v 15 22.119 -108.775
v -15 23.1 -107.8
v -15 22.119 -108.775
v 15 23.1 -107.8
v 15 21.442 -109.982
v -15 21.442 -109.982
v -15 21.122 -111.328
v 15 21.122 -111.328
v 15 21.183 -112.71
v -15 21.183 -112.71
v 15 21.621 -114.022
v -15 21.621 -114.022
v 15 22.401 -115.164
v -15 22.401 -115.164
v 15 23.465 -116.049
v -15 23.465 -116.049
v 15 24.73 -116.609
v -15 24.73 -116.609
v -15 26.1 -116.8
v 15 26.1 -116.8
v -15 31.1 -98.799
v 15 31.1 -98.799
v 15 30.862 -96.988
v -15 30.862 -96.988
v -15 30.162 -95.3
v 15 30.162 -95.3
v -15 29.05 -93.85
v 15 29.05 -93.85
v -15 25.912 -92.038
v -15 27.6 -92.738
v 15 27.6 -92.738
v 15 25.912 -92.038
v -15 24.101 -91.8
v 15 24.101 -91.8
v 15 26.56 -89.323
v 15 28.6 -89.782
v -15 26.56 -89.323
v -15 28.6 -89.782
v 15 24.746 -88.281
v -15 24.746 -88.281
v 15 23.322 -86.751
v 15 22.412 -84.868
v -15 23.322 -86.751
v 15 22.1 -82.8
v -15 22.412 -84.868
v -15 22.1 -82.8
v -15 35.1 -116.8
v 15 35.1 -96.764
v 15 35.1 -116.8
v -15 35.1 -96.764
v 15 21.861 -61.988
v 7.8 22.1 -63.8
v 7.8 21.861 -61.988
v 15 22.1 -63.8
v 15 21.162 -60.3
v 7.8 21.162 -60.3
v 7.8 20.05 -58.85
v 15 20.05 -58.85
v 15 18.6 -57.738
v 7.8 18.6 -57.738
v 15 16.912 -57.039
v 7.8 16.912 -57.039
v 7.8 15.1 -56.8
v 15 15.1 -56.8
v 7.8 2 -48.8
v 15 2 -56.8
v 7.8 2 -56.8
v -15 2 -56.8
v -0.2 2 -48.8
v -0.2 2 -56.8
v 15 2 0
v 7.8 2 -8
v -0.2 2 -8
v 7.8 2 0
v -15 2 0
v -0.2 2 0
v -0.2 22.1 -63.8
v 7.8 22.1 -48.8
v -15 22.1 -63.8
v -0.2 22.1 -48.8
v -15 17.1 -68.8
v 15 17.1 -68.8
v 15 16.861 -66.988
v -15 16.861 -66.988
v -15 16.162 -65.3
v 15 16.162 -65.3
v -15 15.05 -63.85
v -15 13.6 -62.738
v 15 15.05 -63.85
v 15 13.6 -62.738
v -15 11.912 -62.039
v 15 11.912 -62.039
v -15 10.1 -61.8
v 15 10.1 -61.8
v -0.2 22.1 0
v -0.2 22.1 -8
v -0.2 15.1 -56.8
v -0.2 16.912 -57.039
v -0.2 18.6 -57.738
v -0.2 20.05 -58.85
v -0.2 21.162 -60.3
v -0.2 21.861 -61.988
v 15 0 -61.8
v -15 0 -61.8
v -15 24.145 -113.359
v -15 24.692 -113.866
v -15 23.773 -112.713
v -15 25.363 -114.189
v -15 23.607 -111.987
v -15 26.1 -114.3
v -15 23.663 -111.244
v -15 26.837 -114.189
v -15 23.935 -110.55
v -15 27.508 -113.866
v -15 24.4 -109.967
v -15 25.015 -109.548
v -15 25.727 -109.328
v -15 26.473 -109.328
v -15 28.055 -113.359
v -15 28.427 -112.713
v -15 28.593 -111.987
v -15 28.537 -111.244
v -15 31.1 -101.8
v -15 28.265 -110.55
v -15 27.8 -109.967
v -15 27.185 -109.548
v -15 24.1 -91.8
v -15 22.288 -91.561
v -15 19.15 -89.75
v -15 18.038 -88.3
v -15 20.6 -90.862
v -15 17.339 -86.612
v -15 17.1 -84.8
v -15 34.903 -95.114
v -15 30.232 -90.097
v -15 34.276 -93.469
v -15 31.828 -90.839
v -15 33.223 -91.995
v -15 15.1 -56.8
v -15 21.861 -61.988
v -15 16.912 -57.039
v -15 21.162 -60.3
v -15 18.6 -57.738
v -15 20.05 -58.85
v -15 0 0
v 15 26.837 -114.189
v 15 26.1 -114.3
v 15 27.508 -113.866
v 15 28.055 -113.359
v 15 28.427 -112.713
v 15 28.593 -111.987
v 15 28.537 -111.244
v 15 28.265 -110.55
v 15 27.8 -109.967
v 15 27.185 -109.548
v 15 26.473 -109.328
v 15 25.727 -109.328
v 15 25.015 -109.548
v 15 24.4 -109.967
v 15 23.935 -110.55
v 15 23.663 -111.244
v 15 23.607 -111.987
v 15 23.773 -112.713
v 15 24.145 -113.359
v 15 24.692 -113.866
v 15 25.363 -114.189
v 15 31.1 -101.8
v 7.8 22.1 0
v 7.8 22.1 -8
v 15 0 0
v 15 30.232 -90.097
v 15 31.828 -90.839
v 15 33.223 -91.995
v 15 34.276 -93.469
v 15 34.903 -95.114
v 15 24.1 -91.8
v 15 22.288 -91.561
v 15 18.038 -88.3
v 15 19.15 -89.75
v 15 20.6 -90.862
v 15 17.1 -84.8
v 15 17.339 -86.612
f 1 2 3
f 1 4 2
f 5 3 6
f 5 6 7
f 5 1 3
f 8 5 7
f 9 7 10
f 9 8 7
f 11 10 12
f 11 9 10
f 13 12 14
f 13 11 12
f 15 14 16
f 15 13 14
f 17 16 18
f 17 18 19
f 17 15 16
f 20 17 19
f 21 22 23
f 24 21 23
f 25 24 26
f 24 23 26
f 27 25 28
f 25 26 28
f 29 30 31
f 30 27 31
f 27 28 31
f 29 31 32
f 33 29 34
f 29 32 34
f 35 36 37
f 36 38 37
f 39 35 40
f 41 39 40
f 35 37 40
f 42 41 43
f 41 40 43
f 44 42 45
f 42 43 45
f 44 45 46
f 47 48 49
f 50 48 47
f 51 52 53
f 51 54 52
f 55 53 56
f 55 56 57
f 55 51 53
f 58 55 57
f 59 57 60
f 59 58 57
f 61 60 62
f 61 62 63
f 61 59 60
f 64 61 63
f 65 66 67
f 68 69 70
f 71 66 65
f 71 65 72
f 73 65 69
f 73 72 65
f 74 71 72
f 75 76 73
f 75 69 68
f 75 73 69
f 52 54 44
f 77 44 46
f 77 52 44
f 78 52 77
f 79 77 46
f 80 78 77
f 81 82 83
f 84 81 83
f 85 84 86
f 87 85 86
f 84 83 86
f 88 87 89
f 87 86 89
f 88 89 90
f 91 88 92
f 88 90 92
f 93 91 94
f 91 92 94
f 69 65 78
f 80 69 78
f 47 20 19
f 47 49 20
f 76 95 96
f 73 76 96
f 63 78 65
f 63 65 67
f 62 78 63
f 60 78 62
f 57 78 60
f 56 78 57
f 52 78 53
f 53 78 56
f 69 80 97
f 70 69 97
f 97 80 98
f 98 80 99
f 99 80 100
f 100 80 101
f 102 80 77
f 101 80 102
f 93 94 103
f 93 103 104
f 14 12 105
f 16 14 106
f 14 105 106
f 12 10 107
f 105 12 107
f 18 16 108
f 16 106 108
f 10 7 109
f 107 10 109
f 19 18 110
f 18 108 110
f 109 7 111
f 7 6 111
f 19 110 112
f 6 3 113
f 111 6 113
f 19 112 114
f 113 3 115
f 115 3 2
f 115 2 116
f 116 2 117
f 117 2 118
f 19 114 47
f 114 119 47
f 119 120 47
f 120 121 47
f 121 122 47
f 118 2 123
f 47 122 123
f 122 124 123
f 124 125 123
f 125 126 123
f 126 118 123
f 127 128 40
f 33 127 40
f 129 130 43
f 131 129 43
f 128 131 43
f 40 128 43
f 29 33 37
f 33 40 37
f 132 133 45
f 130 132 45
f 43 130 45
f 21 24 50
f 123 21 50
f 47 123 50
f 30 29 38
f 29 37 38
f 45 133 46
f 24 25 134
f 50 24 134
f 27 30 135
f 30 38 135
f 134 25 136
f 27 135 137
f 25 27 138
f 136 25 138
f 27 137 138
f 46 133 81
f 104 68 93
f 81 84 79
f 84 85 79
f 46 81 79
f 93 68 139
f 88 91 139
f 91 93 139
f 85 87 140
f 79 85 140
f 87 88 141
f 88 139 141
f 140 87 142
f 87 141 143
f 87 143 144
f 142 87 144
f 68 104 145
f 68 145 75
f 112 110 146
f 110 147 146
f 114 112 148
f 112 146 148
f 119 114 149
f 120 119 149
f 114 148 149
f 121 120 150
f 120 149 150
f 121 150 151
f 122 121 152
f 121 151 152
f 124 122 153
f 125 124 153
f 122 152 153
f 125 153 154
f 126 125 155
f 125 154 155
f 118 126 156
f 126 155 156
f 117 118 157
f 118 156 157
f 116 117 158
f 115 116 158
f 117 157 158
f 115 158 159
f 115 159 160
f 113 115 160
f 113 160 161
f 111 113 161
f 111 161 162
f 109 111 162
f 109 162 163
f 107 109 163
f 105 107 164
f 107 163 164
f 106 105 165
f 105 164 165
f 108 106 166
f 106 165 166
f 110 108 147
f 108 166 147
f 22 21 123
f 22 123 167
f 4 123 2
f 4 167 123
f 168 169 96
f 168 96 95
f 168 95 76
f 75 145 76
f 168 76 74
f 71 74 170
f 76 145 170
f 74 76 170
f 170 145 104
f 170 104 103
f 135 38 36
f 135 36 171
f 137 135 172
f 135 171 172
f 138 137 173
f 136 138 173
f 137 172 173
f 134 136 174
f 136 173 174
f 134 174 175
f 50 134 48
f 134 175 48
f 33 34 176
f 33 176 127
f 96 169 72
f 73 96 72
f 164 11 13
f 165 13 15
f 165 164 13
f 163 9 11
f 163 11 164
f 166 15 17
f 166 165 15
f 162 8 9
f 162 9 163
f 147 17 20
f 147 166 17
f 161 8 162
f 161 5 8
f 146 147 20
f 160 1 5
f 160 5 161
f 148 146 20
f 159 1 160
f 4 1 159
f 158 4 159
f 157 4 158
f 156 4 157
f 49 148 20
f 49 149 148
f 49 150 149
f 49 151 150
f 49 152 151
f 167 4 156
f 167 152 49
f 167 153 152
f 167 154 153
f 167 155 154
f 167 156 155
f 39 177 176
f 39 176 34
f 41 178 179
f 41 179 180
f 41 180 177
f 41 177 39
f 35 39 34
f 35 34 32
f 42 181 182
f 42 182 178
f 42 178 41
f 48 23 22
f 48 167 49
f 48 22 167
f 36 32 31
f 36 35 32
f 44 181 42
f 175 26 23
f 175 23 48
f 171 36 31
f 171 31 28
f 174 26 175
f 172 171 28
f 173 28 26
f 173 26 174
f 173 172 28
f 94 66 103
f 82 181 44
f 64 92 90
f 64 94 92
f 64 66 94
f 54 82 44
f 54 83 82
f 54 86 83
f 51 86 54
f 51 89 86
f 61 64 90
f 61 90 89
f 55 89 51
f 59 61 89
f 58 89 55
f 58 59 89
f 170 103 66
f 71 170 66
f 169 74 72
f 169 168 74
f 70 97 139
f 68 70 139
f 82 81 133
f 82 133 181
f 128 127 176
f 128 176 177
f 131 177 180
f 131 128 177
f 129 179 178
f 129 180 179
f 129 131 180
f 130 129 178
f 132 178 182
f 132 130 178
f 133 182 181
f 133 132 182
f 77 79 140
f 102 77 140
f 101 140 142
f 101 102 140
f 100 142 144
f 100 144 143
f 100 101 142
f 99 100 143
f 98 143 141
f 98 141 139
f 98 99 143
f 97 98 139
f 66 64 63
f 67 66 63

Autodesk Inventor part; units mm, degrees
ref_plane "YZ Plane" through (0, 0, 0) normal (1, 0, 0) x (0, 1, 0)
ref_plane "XZ Plane" through (0, 0, 0) normal (0, 1, 0) x (-1, 0, 0)
sketch "スケッチ1" plane through (0, 0, 0) normal (0, 1, 0) x (-1, 0, 0)
  line L0 (15, 0) -> (-15, 0)
  line L1 (-15, 0) -> (-15, -56.8)
  line L2 (-15, -56.8) -> (15, -56.8)
  line L3 (15, -56.8) -> (15, 0)
  point P0 (0, 0)
  point P1 (0, 0)
  dimension "d0" = 30
  dimension "d9" = 56.8
extrude "押し出し1" add sketch "スケッチ1" along normal blind 2
ref_plane "作業平面1" through (7.8, 0, 0) normal (1, 0, 0) x (0, 0, -1)
sketch "スケッチ2" plane through (7.8, 0, 0) normal (1, 0, 0) x (0, 0, -1)
  line L0 (0, 2) -> (56.8, 2)
  line L1 (56.8, 2) -> (56.8, 22.1)
  line L2 (56.8, 22.1) -> (0, 22.1)
  line L3 (0, 22.1) -> (0, 2)
  line L4 (8, 2) -> (48.8, 2)
  line L5 (48.8, 2) -> (48.8, 22.1)
  line L6 (48.8, 22.1) -> (8, 22.1)
  line L7 (8, 22.1) -> (8, 2)
  line L8 (0, 2) -> (56.8, 2) projected
  line L9 (0, 0) -> (0, 2) projected
  point P0 (28.4, 22.1)
  dimension "d4" = 56.8
  dimension "d5" = 40.8
  dimension "d6" = 20.1
extrude "押し出し2" add sketch "スケッチ2" against normal blind 8 contours L3 L2 L7 L0 | L5 L2 L1 L0
sketch "スケッチ3" plane through (15, 0, -56.8) normal (0, 0, -1) x (-1, 0, 0)
  line L0 (30, 0) -> (0, 0) projected
  line L1 (0, 0) -> (30, 0)
  line L2 (30, 0) -> (30, 22.1)
  line L3 (30, 22.1) -> (0, 22.1)
  line L4 (0, 22.1) -> (0, 0)
  line L5 (7.2, 22.1) -> (15.2, 22.1) projected
  line L6 (30, 0) -> (30, 2) projected
  point P0 (15, 0)
extrude "押し出し3" add sketch "スケッチ3" along normal blind 5
sketch "スケッチ4" plane through (15, 0, -61.8) normal (0, 0, -1) x (-1, 0, 0)
  line L0 (7.2, 22.1) -> (0, 22.1) projected
  line L1 (30, 2) -> (30, 22.1) projected
  line L2 (0, 22.1) -> (30, 22.1)
  line L3 (30, 22.1) -> (30, 17.1)
  line L4 (30, 17.1) -> (0, 17.1)
  line L5 (0, 17.1) -> (0, 22.1)
  point P0 (15, 0)
  point P1 (7.2, 22.1)
  dimension "d12" = 5
extrude "押し出し4" add sketch "スケッチ4" along normal blind 28
sketch "スケッチ5" plane through (15, 0, -89.8) normal (0, 0, -1) x (-1, 0, 0)
  line L0 (0, 17.1) -> (30, 17.1) projected
  line L1 (0, 17.1) -> (30, 17.1)
  line L2 (30, 17.1) -> (30, 35.1)
  line L3 (30, 35.1) -> (0, 35.1)
  line L4 (0, 35.1) -> (0, 17.1)
  line L5 (30, 17.1) -> (30, 22.1) projected
  line L6 (30, 22.1) -> (0, 22.1) projected
  point P0 (15, 0)
  dimension "d21" = 13
extrude "押し出し5" add sketch "スケッチ5" along normal blind 2
sketch "スケッチ6" plane through (15, 0, -91.8) normal (0, 0, -1) x (-1, 0, 0)
  line L0 (30, 22.1) -> (30, 35.1) projected
  line L1 (0, 35.1) -> (30, 35.1)
  line L2 (30, 35.1) -> (30, 31.1)
  line L3 (30, 31.1) -> (0, 31.1)
  line L4 (0, 31.1) -> (0, 35.1)
  line L5 (0, 35.1) -> (0, 17.1) projected
  line L6 (30, 35.1) -> (0, 35.1) projected
  point P0 (15, 0)
  point P1 (30, 35.1)
  dimension "d18" = 4
extrude "押し出し6" add sketch "スケッチ6" along normal blind 25
fillet "フィレット1" radius 7 7 edges at (0, 17.1, -61.8) (0, 17.1, -91.8) (0, 31.1, -91.8) (0, 22.1, -89.8) (0, 35.1, -89.8) (11.4, 22.1, -56.8) (-7.6, 22.1, -56.8)
sketch "スケッチ7" plane through (15, 0, 0) normal (1, 0, 0) x (0, 0, -1)
  circle A0 centre (111.8, 26.1) radius 5
  circle A1 centre (111.8, 26.1) radius 2.5
  line L0 (98.8, 31.1) -> (116.8, 31.1) projected
  line L1 (116.8, 35.1) -> (116.8, 31.1) projected
  line L2 (116.8, 31.1) -> (116.8, 26.1)
  line L3 (101.8, 31.1) -> (107.8, 23.1)
  point P0 (0, 0)
  dimension "d23" = 10
  dimension "d24" = 5
  dimension "d25" = 10
extrude "押し出し7" add sketch "スケッチ7" against normal up to surface (30 mm away)
properties part number "arm_0"
